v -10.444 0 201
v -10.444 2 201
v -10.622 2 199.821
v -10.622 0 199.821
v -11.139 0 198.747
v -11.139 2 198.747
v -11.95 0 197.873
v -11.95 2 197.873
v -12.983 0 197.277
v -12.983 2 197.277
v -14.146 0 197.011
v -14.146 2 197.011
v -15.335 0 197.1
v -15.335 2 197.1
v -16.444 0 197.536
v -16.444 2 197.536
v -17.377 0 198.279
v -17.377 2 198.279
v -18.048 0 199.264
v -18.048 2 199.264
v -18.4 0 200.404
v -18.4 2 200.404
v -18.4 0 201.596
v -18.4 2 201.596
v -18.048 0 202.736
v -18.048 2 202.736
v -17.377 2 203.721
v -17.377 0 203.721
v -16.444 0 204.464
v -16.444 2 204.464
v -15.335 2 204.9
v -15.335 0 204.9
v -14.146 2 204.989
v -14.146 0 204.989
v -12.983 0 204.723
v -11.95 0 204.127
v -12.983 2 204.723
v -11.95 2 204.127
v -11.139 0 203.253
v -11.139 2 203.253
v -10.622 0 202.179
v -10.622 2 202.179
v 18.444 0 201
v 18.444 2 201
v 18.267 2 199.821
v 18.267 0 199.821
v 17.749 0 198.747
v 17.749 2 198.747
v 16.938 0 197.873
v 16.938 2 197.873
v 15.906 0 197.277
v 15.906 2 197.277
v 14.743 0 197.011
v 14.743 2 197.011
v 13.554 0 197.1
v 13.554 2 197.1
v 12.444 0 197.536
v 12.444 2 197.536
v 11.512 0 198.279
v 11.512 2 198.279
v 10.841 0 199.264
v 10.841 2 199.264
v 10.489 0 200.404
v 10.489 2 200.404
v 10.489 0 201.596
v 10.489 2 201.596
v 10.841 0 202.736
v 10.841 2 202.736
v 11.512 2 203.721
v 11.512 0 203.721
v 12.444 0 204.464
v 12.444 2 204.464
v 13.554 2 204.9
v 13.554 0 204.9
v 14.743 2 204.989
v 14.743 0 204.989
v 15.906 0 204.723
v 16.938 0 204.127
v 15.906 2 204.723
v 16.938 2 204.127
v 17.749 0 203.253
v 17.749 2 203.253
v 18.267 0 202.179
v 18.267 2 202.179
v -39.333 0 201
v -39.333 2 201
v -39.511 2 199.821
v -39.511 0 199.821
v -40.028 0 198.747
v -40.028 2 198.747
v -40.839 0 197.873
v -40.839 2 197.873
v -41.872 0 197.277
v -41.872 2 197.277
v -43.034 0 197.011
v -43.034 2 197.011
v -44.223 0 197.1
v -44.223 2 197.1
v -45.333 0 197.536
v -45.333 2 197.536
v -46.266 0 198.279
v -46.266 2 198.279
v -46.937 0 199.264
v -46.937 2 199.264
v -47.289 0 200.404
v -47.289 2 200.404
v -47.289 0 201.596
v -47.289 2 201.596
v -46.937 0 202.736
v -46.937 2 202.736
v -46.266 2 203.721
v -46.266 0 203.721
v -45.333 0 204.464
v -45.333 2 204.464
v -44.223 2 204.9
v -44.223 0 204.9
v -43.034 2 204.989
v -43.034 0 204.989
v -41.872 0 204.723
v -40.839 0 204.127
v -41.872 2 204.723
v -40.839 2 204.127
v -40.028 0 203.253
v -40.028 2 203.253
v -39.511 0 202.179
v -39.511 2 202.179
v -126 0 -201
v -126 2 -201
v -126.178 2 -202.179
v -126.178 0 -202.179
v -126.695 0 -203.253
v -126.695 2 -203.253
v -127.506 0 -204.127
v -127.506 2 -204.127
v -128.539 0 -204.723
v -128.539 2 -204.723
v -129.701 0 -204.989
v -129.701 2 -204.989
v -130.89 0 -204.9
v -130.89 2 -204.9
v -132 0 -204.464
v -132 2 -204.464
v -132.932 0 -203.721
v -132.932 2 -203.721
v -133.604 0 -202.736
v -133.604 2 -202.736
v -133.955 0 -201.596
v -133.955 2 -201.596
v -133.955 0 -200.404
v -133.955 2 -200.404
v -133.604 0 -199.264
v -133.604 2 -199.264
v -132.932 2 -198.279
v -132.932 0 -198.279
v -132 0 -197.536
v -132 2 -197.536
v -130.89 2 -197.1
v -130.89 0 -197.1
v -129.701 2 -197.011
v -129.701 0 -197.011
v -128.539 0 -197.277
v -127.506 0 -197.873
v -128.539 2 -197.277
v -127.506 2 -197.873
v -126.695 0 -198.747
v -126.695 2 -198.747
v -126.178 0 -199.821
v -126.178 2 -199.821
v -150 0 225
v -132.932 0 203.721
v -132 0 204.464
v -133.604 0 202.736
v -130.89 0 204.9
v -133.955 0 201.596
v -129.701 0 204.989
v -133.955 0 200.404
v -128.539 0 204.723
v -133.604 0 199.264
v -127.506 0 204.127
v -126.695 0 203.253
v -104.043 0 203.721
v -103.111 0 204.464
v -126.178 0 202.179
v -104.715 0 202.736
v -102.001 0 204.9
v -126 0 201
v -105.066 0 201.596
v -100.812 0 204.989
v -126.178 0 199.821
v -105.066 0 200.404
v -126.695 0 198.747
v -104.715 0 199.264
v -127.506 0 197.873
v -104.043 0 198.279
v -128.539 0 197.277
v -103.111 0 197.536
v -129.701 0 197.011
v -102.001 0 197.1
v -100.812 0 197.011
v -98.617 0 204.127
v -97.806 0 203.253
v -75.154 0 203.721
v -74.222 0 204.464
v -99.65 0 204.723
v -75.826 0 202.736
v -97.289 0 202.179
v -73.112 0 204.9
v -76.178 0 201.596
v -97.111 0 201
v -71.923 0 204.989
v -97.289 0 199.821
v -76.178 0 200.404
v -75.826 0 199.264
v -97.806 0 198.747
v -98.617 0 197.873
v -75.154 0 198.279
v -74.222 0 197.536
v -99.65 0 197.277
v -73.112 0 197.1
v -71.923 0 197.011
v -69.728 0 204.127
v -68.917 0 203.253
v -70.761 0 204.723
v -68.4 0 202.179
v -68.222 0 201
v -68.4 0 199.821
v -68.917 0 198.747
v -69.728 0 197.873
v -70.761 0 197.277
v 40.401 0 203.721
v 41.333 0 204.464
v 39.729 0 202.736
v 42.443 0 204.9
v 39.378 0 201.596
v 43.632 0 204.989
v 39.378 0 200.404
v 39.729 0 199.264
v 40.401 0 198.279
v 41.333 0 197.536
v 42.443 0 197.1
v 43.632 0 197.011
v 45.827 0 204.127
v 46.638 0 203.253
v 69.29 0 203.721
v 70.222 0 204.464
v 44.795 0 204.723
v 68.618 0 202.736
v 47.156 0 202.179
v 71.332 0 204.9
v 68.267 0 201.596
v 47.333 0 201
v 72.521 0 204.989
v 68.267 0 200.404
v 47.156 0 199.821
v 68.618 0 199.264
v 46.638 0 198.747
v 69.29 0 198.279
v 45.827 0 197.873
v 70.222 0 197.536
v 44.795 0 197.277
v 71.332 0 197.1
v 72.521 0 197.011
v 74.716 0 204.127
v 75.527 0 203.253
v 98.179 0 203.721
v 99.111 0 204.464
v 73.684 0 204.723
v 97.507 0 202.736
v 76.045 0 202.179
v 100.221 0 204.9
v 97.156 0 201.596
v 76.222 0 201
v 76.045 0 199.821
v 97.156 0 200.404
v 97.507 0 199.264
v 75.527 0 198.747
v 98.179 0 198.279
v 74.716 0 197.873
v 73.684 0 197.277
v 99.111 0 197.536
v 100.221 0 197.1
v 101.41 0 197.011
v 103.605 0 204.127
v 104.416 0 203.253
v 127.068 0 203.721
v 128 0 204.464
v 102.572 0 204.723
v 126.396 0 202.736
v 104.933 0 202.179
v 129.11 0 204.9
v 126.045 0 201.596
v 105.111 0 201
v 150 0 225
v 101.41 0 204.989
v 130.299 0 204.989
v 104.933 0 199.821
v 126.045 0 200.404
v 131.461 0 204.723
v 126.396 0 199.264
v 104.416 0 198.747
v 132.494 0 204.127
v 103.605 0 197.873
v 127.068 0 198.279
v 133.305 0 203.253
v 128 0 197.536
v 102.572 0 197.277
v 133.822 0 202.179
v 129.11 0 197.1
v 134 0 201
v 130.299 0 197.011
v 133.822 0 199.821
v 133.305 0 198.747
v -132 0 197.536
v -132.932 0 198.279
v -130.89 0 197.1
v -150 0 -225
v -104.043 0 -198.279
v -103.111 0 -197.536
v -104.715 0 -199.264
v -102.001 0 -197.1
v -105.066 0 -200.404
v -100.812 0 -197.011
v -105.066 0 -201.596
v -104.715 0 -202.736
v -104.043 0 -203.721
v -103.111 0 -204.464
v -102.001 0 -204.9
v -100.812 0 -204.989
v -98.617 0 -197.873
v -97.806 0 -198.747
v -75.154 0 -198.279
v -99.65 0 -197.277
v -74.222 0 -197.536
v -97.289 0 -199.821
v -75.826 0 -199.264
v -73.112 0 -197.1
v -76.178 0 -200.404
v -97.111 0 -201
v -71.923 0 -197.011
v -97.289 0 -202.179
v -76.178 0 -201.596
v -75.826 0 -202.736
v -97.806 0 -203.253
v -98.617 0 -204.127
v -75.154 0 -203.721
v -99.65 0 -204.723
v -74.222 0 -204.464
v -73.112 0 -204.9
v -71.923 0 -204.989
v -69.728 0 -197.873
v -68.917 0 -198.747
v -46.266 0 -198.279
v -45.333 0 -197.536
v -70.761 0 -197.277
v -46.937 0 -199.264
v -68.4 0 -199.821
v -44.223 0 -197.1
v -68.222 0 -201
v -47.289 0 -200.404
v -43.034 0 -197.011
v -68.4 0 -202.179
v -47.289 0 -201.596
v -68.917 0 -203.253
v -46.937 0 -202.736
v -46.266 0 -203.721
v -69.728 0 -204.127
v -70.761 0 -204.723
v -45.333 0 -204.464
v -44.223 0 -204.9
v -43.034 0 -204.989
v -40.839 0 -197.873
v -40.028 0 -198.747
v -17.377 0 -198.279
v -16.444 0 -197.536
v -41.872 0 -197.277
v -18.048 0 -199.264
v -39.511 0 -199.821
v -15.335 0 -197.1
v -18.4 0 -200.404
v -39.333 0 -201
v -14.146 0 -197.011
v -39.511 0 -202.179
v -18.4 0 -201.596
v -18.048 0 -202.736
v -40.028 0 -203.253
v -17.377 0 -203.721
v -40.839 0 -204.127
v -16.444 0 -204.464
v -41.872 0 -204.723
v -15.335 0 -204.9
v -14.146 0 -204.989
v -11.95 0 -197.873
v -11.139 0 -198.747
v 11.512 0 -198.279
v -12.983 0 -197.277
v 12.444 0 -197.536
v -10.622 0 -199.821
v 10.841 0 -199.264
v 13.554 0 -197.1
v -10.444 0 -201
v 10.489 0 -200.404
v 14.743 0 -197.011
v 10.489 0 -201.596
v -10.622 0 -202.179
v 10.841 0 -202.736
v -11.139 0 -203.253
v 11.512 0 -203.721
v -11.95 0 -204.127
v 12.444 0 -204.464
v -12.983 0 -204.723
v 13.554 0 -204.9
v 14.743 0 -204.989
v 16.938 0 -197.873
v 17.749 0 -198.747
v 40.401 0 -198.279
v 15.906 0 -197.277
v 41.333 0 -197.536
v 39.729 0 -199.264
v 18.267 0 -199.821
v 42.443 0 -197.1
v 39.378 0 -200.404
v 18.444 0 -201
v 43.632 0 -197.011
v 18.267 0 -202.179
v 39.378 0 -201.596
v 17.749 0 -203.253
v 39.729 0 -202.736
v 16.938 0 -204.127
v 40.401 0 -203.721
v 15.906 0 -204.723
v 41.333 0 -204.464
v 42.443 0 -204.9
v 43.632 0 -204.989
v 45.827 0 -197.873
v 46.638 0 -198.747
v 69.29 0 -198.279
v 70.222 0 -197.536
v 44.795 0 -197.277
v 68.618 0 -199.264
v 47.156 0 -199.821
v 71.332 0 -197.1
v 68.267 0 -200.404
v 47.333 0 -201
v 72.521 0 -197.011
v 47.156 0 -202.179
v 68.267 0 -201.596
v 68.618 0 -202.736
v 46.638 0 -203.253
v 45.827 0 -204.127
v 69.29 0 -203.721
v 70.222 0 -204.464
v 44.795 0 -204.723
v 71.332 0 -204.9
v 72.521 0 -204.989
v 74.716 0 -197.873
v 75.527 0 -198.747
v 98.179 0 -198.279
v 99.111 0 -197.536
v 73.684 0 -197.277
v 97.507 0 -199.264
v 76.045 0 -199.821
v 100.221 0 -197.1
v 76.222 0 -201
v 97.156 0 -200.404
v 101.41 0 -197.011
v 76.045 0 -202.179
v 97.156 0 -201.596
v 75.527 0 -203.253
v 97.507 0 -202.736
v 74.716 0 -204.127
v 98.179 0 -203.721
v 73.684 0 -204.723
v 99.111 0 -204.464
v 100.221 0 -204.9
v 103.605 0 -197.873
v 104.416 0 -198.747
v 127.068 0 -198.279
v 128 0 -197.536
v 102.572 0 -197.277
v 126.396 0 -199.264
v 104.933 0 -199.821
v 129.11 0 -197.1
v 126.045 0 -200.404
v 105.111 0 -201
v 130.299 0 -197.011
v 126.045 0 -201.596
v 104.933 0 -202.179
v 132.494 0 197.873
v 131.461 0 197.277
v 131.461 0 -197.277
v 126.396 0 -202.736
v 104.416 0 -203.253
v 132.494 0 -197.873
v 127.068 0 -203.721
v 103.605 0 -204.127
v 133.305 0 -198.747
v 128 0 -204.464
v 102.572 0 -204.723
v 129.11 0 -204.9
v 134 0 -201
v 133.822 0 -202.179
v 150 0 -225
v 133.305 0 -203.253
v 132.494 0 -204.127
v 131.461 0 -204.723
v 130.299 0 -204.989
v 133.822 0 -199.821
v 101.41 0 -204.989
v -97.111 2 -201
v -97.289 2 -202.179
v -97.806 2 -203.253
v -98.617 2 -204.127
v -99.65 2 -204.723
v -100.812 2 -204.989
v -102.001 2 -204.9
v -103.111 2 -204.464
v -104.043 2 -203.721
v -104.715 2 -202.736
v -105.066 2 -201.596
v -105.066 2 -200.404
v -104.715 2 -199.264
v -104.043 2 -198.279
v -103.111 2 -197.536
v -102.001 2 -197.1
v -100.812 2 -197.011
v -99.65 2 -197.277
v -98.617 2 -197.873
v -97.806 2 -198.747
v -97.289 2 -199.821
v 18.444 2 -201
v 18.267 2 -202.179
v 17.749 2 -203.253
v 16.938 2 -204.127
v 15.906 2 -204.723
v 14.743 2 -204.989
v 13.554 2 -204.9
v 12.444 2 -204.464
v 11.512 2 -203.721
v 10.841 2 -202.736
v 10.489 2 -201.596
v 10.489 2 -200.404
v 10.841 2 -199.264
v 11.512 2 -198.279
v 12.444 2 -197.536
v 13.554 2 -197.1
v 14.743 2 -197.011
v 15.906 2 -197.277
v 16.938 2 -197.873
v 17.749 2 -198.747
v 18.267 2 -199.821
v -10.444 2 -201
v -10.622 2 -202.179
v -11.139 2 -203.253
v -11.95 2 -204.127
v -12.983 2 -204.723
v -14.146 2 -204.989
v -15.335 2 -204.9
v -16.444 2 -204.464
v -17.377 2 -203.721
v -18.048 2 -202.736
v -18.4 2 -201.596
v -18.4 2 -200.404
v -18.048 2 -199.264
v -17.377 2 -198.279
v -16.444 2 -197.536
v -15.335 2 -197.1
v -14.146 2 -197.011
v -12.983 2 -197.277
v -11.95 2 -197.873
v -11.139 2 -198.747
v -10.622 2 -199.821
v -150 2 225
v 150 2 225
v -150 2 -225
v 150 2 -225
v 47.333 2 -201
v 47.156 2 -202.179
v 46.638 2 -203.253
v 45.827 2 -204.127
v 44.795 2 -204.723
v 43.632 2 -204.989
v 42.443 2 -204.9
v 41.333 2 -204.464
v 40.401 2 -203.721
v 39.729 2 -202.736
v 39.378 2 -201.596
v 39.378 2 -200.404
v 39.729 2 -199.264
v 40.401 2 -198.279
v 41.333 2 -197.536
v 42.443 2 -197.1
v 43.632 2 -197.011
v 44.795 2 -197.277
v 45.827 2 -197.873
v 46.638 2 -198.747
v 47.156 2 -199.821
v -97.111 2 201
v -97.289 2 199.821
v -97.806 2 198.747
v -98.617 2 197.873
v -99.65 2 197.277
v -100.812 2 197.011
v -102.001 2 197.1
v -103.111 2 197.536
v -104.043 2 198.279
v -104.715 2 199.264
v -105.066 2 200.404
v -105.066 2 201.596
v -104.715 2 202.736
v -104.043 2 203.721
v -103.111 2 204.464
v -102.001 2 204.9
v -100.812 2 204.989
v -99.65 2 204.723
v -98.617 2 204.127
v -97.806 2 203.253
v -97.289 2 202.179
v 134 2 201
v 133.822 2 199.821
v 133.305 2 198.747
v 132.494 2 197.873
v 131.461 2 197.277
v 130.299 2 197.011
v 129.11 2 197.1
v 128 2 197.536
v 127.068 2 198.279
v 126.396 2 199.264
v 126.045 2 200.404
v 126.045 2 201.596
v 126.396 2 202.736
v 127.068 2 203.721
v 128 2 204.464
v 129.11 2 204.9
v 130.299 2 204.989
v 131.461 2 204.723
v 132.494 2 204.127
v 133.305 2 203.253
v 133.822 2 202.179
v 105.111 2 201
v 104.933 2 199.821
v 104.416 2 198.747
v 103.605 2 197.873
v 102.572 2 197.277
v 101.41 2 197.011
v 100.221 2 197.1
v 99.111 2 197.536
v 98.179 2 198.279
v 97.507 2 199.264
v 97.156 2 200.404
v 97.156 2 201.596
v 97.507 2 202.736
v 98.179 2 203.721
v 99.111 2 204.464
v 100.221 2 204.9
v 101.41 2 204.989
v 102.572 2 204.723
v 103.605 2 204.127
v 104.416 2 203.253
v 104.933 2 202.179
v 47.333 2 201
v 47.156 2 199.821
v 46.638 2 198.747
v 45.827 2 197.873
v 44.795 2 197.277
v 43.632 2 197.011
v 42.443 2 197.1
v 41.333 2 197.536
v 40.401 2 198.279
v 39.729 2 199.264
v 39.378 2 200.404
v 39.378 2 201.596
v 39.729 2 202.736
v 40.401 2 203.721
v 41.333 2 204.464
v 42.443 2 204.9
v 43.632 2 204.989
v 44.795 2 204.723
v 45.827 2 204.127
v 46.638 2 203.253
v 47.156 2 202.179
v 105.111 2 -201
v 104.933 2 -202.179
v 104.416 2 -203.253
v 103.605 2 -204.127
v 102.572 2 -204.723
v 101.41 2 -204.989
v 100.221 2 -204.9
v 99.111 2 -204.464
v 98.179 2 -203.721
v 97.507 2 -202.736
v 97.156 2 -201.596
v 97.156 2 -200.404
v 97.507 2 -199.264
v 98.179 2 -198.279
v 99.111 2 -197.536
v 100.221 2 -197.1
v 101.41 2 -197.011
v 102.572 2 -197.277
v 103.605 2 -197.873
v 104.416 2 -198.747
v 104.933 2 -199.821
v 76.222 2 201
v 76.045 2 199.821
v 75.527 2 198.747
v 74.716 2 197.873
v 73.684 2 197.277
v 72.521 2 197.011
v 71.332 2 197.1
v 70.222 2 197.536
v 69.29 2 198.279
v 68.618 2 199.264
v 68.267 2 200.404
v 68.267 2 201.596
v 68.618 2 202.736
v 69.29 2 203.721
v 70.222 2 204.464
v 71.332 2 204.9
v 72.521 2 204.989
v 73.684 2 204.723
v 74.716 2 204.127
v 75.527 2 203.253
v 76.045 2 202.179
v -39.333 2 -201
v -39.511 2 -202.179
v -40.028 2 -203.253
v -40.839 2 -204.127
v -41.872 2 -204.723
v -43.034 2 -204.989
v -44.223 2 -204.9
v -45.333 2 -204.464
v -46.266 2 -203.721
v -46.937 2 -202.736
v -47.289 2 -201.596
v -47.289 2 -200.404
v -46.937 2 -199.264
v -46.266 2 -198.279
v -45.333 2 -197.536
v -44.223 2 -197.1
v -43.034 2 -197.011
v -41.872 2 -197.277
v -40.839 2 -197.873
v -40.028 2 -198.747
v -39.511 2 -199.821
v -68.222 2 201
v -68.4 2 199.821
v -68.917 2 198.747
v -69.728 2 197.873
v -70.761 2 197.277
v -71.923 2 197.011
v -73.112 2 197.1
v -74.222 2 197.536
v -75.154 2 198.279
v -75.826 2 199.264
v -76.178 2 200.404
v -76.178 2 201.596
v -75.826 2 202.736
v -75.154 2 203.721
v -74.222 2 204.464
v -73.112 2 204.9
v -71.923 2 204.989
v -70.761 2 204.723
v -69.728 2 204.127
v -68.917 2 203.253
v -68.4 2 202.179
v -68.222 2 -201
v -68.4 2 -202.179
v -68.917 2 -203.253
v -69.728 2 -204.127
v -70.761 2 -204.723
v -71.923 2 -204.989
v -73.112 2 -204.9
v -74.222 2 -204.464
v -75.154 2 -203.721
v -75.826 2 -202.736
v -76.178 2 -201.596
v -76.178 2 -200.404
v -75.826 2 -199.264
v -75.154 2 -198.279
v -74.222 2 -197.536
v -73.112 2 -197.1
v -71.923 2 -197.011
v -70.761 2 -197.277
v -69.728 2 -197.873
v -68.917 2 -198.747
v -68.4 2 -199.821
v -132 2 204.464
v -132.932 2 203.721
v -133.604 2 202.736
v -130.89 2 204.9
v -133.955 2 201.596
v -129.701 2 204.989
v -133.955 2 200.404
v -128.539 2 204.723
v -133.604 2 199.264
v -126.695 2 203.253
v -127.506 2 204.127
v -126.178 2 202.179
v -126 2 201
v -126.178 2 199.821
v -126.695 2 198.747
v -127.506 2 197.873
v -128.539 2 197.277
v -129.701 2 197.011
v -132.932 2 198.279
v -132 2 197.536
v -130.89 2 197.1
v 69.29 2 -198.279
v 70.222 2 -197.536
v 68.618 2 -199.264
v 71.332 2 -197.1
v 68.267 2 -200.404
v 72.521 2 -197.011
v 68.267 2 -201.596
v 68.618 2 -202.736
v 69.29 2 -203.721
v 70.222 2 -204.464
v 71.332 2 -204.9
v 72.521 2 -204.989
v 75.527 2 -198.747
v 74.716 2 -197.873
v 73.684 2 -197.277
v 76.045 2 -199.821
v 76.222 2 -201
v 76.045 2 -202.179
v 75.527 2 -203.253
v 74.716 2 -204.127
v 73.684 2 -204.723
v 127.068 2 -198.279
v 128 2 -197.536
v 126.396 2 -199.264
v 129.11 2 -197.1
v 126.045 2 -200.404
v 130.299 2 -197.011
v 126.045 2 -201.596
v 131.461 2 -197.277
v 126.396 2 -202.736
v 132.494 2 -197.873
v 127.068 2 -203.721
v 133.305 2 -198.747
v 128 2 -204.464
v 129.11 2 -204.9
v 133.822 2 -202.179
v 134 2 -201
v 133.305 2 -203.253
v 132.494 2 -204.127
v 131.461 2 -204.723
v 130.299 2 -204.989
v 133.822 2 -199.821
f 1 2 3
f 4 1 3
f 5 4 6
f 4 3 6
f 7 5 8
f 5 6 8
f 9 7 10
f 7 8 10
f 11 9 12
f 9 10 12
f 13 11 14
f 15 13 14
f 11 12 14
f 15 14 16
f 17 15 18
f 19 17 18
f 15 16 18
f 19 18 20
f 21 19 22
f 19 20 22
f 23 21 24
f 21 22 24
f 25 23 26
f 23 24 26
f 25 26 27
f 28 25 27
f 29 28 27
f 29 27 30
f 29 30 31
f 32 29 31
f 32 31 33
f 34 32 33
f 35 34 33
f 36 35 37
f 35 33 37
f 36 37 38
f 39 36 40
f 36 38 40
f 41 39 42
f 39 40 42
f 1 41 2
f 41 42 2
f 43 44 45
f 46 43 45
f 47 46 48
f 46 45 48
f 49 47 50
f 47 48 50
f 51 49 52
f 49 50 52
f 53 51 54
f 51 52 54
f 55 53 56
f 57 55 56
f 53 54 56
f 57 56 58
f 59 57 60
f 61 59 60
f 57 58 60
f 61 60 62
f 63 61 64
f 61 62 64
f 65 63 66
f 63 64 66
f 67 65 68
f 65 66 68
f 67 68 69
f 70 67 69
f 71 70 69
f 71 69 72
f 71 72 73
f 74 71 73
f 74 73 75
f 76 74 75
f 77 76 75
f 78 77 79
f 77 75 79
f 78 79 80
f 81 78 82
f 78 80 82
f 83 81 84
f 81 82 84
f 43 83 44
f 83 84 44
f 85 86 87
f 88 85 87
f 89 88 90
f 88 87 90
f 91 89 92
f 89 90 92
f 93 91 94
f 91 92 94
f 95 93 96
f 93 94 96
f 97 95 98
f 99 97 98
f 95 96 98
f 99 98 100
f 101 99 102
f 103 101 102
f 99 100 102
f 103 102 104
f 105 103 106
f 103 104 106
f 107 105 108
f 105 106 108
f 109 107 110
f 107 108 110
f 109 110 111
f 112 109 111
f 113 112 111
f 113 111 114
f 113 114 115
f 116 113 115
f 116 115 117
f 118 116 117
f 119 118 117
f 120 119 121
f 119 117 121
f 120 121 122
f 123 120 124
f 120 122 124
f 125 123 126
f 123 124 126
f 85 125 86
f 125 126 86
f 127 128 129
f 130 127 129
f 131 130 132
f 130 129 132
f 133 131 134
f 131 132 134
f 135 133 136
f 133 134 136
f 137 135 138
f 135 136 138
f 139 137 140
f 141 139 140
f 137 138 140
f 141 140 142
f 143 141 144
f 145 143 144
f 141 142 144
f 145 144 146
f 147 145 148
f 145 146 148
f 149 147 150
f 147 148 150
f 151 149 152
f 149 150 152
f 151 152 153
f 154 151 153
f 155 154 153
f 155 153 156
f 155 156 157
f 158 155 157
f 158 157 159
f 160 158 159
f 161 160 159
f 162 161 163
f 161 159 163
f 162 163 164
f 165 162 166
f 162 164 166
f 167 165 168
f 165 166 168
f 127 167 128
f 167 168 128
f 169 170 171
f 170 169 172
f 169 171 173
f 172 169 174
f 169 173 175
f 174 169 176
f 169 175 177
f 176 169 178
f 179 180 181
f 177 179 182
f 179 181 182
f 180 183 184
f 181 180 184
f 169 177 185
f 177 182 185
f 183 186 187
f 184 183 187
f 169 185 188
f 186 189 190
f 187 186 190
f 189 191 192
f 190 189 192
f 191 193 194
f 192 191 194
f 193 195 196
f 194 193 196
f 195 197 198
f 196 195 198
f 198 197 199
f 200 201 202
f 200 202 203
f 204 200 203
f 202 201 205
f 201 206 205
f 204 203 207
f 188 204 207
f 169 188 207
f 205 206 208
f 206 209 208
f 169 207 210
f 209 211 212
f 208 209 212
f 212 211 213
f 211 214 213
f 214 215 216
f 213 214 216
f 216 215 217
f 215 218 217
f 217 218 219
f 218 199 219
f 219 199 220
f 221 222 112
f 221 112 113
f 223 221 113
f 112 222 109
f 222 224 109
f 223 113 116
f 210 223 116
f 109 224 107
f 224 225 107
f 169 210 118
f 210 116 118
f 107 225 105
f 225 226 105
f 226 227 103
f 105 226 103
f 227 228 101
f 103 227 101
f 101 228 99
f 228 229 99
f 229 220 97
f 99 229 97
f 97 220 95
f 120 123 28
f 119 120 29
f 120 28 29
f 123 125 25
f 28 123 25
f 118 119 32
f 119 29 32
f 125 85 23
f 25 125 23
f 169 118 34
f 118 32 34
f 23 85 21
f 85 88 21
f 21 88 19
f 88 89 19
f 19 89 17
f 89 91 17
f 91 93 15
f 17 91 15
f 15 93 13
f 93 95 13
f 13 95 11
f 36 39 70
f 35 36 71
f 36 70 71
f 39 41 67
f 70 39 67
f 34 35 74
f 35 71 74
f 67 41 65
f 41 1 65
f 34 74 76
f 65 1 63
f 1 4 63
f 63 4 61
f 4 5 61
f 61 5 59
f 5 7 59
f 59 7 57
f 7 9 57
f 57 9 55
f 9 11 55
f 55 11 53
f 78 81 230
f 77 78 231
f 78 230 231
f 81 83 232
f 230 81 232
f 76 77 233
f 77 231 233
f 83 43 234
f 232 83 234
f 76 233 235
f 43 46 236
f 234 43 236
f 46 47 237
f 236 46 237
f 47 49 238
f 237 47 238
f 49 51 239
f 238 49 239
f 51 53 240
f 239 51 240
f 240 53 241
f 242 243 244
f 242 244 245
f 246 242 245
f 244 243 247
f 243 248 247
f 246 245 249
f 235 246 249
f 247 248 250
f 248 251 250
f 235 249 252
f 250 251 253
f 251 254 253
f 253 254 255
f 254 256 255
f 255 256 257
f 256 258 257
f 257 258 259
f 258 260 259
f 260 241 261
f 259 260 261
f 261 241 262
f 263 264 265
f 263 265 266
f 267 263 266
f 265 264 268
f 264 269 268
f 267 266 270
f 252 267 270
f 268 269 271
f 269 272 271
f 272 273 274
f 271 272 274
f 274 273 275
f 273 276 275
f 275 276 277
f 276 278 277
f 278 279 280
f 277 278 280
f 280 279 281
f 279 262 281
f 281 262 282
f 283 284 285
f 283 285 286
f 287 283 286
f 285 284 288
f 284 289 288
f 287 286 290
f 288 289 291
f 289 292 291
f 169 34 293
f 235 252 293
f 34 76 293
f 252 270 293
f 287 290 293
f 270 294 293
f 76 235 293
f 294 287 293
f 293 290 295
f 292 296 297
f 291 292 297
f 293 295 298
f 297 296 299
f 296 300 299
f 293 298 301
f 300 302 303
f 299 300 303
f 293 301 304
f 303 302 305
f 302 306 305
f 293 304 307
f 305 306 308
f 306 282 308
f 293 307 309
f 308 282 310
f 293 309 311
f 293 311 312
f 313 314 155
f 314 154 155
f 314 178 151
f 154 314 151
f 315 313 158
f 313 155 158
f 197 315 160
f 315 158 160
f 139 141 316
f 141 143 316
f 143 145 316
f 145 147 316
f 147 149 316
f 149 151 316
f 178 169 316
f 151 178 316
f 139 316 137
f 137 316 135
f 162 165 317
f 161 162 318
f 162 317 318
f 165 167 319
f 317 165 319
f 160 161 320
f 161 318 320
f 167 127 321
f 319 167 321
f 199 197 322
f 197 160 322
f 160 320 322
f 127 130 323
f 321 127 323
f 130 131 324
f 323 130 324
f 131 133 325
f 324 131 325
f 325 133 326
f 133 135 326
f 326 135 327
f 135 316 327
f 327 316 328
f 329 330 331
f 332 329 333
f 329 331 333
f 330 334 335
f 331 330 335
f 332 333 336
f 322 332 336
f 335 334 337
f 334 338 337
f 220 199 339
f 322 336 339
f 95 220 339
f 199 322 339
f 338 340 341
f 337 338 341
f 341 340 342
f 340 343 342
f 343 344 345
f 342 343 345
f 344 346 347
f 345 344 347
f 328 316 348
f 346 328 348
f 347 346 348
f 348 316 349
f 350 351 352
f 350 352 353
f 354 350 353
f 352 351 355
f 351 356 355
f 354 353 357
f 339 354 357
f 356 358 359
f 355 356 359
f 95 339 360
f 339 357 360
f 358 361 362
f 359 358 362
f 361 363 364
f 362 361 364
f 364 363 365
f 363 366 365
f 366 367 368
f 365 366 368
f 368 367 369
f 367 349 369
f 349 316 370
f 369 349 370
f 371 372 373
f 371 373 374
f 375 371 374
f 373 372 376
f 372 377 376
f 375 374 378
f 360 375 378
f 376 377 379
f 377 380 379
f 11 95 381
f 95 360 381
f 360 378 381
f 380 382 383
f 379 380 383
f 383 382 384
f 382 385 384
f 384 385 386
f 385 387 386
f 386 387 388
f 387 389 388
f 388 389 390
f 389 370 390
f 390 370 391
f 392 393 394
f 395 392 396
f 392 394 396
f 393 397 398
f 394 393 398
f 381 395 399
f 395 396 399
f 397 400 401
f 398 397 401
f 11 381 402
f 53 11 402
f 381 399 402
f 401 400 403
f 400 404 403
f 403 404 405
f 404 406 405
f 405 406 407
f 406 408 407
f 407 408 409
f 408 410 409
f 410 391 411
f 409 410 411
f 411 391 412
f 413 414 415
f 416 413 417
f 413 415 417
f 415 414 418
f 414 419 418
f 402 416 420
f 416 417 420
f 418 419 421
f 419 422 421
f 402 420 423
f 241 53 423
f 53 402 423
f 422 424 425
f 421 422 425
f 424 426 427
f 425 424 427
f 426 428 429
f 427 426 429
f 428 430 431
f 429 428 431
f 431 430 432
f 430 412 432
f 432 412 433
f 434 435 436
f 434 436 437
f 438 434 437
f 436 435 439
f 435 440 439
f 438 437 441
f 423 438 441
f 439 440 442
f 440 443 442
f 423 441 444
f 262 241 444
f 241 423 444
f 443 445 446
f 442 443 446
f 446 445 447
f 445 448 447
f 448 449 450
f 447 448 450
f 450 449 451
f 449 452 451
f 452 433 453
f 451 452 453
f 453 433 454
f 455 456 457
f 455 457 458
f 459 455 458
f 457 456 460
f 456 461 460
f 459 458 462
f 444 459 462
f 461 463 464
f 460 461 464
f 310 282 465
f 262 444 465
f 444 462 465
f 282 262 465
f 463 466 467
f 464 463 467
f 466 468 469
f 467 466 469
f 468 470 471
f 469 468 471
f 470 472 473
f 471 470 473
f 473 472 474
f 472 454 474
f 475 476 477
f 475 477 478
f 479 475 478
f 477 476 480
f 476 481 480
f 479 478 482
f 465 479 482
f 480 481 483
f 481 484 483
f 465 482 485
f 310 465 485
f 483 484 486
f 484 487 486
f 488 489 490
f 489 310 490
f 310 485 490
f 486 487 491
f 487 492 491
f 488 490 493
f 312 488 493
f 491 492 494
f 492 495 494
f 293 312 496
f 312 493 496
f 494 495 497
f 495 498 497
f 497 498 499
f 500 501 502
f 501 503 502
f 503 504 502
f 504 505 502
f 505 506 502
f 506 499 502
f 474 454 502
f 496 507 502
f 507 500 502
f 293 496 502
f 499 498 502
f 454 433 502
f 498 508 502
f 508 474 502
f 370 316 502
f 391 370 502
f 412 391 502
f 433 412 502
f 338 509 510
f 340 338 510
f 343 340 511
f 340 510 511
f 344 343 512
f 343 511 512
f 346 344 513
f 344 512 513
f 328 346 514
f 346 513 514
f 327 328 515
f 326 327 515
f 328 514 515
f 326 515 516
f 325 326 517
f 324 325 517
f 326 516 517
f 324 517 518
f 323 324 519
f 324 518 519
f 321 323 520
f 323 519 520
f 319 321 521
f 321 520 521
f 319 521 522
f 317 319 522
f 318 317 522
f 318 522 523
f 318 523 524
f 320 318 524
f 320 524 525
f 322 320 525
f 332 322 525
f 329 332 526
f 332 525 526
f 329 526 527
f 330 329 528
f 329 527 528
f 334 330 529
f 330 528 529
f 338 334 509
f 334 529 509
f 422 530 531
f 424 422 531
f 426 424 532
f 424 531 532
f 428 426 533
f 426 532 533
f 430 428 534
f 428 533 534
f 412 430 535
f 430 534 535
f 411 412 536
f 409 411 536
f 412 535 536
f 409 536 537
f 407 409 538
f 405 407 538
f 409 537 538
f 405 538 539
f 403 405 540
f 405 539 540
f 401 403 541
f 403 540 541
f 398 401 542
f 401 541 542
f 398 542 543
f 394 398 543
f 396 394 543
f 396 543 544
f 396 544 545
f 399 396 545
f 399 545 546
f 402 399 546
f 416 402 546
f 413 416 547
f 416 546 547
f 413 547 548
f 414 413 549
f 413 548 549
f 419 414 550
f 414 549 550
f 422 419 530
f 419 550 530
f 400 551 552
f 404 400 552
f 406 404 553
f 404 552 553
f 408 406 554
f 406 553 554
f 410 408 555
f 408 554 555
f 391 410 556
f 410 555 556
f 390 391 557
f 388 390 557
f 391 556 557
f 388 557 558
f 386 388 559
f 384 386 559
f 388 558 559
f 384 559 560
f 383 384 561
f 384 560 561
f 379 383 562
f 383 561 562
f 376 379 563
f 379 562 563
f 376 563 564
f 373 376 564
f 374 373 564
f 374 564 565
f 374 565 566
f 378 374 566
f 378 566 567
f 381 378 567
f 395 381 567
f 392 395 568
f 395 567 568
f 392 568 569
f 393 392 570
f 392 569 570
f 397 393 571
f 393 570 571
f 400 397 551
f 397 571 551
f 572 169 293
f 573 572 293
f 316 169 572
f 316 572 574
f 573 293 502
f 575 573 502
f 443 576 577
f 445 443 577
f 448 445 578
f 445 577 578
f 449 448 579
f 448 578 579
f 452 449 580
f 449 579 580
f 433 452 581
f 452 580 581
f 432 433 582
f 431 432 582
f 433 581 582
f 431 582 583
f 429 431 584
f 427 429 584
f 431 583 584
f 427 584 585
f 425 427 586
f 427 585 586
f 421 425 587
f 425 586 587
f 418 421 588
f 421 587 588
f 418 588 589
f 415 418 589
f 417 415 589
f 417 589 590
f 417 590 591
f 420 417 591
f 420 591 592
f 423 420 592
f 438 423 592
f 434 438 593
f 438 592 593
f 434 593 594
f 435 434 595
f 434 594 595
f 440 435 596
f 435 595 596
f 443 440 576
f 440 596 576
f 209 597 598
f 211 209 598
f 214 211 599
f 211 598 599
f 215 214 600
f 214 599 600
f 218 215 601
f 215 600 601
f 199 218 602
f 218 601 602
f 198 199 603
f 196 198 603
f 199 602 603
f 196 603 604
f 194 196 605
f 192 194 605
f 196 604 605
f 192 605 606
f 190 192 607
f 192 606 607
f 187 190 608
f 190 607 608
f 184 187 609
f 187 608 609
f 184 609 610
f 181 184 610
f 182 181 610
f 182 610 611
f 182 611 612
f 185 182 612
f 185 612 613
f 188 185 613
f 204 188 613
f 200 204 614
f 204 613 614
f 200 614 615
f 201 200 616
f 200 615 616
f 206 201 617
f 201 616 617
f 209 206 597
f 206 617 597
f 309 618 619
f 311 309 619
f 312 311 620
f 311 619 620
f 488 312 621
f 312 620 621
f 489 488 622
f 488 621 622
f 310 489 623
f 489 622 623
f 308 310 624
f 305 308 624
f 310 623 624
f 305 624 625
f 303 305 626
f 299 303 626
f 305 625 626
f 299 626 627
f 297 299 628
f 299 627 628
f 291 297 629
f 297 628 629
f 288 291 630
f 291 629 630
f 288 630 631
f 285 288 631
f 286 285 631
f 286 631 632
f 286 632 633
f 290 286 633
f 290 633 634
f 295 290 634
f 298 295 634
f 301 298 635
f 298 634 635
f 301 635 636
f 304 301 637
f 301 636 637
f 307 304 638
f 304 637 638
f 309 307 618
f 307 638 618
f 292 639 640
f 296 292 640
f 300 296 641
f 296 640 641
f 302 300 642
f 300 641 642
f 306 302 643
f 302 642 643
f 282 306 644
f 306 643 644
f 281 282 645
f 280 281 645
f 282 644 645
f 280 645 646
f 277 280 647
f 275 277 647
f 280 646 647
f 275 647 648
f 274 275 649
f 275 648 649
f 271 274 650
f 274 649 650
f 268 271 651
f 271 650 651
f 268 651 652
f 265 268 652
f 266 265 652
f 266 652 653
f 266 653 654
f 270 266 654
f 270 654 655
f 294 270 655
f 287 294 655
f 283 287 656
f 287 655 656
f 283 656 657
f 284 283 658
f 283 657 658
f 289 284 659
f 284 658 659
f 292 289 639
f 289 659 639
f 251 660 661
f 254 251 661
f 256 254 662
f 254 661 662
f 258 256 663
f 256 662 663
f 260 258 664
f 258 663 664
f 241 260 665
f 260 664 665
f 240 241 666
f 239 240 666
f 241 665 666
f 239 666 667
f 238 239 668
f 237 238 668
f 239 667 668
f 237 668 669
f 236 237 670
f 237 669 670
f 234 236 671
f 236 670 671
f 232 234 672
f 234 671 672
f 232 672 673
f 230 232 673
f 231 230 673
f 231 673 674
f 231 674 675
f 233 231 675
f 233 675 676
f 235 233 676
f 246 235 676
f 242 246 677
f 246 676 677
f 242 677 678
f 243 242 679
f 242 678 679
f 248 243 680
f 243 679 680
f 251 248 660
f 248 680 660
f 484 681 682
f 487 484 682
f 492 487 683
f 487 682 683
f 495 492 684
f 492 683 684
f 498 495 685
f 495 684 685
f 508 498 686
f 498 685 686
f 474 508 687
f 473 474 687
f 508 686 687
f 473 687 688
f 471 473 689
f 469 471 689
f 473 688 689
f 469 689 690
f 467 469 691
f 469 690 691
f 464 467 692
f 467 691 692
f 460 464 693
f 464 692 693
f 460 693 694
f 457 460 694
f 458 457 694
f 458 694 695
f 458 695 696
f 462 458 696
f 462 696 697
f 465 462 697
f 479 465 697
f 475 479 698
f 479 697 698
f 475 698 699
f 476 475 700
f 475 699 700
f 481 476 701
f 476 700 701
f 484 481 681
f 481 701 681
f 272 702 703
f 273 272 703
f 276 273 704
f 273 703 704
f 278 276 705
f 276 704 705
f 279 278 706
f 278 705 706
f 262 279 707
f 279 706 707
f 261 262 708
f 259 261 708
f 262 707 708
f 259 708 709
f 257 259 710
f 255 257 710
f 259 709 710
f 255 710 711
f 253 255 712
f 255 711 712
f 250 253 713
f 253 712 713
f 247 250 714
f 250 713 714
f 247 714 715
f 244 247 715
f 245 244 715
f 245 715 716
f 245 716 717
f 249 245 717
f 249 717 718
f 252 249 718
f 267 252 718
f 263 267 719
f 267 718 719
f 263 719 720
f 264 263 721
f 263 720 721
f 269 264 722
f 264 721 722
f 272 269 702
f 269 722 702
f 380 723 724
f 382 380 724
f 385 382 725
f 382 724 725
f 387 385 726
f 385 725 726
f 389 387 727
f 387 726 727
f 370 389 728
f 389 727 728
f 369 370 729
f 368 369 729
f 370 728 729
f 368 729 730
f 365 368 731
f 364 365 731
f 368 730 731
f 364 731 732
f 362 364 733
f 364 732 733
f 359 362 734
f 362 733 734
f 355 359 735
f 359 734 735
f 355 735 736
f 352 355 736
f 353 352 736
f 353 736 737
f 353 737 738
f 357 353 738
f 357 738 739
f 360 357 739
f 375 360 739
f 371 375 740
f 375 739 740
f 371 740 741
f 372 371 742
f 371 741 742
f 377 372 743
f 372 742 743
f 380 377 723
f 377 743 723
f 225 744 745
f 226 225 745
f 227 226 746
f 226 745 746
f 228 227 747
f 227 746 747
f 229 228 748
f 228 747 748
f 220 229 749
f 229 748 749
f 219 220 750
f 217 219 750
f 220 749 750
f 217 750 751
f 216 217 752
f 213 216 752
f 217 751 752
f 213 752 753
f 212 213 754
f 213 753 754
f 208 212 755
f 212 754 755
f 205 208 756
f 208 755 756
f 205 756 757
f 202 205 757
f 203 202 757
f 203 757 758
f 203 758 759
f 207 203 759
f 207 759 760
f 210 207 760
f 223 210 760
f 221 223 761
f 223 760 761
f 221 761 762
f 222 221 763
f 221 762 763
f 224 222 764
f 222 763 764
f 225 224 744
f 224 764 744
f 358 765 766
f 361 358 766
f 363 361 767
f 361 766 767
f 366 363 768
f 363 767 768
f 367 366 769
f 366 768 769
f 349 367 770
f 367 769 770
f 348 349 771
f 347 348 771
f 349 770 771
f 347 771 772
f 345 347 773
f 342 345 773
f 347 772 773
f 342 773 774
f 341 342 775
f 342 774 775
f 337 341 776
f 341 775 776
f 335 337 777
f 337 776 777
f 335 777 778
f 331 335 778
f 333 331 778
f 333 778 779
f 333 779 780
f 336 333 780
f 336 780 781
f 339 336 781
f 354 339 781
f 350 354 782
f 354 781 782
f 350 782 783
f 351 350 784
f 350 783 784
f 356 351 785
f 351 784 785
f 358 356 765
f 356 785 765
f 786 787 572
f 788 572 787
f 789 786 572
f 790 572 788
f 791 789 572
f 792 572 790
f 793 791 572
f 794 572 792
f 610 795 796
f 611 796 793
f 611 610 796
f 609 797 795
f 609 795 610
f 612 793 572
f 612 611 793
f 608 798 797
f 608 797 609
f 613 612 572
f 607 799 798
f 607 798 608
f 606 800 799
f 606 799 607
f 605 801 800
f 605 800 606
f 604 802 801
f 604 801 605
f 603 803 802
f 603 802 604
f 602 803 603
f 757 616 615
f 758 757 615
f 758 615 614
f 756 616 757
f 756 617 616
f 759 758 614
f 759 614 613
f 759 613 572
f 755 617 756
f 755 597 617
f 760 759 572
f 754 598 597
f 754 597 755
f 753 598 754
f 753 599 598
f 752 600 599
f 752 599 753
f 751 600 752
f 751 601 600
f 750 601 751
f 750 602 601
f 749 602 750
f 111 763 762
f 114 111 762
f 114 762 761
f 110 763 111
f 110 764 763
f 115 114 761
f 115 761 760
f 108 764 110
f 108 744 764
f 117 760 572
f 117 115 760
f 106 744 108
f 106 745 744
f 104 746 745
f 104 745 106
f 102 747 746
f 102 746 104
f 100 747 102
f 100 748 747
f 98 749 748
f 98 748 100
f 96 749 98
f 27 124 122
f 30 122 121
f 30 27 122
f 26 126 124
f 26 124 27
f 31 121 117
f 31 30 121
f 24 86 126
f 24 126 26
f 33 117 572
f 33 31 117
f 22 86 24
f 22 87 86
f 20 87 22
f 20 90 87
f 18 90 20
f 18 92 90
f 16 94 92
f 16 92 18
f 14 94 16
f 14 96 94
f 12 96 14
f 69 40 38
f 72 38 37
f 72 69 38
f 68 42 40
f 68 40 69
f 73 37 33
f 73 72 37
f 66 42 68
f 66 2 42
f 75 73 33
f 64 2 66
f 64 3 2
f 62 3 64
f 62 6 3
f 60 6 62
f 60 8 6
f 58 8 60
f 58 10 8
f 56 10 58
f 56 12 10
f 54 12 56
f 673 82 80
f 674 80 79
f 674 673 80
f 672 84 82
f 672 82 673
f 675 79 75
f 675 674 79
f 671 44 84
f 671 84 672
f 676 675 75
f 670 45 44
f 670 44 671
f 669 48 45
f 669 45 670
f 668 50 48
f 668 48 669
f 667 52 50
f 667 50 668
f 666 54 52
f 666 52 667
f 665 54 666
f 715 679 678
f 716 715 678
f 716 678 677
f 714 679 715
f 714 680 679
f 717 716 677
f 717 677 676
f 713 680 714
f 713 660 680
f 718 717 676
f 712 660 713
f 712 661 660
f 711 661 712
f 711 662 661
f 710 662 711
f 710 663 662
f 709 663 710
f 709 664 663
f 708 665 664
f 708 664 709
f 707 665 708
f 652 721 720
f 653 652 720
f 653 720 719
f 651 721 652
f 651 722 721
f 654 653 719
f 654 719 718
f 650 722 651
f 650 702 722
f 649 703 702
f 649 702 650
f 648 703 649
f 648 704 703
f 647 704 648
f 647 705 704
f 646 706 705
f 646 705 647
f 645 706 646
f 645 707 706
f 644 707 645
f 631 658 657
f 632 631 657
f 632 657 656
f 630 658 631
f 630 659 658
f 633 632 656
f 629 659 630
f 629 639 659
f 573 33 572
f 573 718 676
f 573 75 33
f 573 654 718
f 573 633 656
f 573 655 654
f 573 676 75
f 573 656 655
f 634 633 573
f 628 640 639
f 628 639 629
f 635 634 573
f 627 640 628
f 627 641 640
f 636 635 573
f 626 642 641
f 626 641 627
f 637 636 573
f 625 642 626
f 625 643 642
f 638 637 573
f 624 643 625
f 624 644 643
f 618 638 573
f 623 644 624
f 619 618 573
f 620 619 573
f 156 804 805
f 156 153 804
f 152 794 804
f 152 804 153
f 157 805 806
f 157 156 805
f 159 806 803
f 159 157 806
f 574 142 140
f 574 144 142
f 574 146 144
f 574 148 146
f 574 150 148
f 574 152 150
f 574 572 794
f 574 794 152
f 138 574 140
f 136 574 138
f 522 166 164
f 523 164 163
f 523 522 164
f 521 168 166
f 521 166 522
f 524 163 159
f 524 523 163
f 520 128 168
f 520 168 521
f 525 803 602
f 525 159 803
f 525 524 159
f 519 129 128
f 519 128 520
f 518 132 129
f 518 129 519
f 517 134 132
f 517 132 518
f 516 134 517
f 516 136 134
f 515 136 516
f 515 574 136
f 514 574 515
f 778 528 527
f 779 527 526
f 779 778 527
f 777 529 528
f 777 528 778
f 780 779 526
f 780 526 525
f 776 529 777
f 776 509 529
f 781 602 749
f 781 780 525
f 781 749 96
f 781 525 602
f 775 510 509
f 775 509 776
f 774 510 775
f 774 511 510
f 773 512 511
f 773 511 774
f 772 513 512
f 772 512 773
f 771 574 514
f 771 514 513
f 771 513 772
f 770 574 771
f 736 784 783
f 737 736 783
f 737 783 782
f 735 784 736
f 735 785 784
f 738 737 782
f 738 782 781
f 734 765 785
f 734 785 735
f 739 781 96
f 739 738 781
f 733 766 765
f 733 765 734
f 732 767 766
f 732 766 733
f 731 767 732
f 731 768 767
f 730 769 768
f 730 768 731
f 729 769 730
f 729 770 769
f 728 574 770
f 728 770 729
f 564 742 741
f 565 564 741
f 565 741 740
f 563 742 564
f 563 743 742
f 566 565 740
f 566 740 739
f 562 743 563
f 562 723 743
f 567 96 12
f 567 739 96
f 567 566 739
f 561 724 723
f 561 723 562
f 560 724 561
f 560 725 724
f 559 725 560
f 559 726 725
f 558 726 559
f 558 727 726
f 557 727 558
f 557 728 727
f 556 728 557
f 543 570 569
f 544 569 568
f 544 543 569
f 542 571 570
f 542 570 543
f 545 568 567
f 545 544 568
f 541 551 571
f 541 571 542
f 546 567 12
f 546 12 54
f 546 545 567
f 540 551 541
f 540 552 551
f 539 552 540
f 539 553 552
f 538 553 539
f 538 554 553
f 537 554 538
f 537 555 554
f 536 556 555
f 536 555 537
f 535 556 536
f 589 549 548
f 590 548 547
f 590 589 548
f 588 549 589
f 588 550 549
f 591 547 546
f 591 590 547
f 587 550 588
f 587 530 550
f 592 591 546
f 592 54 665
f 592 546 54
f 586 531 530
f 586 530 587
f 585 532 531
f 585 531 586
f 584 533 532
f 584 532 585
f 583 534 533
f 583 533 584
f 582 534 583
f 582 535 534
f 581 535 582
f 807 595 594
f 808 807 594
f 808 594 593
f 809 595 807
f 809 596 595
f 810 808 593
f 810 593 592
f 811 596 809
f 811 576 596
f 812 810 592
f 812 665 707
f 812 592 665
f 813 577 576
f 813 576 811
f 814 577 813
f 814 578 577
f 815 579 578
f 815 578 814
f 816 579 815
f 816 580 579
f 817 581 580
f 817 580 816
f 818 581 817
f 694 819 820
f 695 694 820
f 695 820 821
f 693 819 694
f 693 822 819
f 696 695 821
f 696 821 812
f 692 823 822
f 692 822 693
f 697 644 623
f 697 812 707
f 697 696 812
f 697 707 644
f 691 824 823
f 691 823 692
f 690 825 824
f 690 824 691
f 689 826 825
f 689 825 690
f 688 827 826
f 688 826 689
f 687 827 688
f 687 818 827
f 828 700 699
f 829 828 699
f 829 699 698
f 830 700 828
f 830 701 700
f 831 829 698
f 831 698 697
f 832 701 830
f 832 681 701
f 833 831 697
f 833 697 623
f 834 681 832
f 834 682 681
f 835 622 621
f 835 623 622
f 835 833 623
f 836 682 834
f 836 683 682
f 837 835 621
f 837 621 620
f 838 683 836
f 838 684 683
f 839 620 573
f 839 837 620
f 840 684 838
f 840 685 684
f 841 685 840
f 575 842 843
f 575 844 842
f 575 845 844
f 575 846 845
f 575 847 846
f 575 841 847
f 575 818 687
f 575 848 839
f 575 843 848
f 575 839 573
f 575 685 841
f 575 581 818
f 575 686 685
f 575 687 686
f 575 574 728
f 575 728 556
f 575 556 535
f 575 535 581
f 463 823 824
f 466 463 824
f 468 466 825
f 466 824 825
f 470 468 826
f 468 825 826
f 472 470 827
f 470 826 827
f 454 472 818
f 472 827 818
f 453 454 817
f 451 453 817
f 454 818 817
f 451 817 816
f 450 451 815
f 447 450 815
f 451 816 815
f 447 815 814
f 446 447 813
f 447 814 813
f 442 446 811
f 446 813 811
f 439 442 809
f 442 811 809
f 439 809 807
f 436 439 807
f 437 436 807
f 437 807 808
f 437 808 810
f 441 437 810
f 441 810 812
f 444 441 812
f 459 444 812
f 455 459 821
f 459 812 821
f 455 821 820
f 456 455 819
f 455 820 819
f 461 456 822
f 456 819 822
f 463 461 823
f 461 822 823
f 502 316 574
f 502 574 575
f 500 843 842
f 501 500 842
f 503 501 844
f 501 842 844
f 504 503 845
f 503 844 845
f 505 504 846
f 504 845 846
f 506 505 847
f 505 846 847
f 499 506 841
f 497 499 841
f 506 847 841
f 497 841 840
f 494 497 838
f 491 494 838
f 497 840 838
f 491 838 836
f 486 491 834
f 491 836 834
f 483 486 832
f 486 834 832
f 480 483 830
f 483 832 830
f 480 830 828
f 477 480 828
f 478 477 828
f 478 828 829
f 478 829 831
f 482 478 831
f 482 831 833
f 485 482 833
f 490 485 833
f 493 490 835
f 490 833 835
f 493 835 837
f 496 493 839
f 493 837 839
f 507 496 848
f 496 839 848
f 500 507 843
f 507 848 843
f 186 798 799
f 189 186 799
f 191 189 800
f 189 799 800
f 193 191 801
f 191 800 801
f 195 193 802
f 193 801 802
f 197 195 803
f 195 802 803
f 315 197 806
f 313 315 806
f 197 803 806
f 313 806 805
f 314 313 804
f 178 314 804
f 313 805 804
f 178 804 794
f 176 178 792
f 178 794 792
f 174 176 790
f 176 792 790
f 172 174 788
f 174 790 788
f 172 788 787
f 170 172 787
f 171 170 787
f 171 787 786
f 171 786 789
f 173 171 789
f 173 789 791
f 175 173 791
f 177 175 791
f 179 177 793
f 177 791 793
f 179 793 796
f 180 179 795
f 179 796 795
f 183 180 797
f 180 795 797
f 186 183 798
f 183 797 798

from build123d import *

# Parameters (mm, degrees)
SKETCH2_W           = 300
SKETCH2_H           = 450
BOSS_EXTRUDE1_DEPTH = 2
SKETCH3_R           = 4
CUT_EXTRUDE1_DEPTH  = 2


with BuildPart() as part:
    # Sketch2 → Boss-Extrude1 (new body)
    with BuildSketch(Plane(origin=(0, 0, 0), x_dir=(1, 0, 0), z_dir=(0, 1, 0))):
        Rectangle(SKETCH2_W, SKETCH2_H)
    extrude(amount=BOSS_EXTRUDE1_DEPTH)

    # Sketch3 → Cut-Extrude1 (cut)
    with BuildSketch(Plane(origin=(0, 2, 0), x_dir=(1, 0, 0), z_dir=(0, 1, 0))):
        with Locations((-130, 201)):
            Circle(SKETCH3_R)
        with Locations((-101.111111111, 201)):
            Circle(SKETCH3_R)
        with Locations((-72.222222222, 201)):
            Circle(SKETCH3_R)
        with Locations((-43.333333333, 201)):
            Circle(SKETCH3_R)
        with Locations((-14.444444444, 201)):
            Circle(SKETCH3_R)
        with Locations((14.444444444, 201)):
            Circle(SKETCH3_R)
        with Locations((43.333333333, 201)):
            Circle(SKETCH3_R)
        with Locations((72.222222222, 201)):
            Circle(SKETCH3_R)
        with Locations((101.111111111, 201)):
            Circle(SKETCH3_R)
        with Locations((130, 201)):
            Circle(SKETCH3_R)
        with Locations((130, -201)):
            Circle(SKETCH3_R)
        with Locations((101.111111111, -201)):
            Circle(SKETCH3_R)
        with Locations((72.222222222, -201)):
            Circle(SKETCH3_R)
        with Locations((43.333333333, -201)):
            Circle(SKETCH3_R)
        with Locations((14.444444444, -201)):
            Circle(SKETCH3_R)
        with Locations((-14.444444444, -201)):
            Circle(SKETCH3_R)
        with Locations((-43.333333333, -201)):
            Circle(SKETCH3_R)
        with Locations((-72.222222222, -201)):
            Circle(SKETCH3_R)
        with Locations((-101.111111111, -201)):
            Circle(SKETCH3_R)
        with Locations((-130, -201)):
            Circle(SKETCH3_R)
    extrude(amount=-CUT_EXTRUDE1_DEPTH, mode=Mode.SUBTRACT)


solid = part.part
